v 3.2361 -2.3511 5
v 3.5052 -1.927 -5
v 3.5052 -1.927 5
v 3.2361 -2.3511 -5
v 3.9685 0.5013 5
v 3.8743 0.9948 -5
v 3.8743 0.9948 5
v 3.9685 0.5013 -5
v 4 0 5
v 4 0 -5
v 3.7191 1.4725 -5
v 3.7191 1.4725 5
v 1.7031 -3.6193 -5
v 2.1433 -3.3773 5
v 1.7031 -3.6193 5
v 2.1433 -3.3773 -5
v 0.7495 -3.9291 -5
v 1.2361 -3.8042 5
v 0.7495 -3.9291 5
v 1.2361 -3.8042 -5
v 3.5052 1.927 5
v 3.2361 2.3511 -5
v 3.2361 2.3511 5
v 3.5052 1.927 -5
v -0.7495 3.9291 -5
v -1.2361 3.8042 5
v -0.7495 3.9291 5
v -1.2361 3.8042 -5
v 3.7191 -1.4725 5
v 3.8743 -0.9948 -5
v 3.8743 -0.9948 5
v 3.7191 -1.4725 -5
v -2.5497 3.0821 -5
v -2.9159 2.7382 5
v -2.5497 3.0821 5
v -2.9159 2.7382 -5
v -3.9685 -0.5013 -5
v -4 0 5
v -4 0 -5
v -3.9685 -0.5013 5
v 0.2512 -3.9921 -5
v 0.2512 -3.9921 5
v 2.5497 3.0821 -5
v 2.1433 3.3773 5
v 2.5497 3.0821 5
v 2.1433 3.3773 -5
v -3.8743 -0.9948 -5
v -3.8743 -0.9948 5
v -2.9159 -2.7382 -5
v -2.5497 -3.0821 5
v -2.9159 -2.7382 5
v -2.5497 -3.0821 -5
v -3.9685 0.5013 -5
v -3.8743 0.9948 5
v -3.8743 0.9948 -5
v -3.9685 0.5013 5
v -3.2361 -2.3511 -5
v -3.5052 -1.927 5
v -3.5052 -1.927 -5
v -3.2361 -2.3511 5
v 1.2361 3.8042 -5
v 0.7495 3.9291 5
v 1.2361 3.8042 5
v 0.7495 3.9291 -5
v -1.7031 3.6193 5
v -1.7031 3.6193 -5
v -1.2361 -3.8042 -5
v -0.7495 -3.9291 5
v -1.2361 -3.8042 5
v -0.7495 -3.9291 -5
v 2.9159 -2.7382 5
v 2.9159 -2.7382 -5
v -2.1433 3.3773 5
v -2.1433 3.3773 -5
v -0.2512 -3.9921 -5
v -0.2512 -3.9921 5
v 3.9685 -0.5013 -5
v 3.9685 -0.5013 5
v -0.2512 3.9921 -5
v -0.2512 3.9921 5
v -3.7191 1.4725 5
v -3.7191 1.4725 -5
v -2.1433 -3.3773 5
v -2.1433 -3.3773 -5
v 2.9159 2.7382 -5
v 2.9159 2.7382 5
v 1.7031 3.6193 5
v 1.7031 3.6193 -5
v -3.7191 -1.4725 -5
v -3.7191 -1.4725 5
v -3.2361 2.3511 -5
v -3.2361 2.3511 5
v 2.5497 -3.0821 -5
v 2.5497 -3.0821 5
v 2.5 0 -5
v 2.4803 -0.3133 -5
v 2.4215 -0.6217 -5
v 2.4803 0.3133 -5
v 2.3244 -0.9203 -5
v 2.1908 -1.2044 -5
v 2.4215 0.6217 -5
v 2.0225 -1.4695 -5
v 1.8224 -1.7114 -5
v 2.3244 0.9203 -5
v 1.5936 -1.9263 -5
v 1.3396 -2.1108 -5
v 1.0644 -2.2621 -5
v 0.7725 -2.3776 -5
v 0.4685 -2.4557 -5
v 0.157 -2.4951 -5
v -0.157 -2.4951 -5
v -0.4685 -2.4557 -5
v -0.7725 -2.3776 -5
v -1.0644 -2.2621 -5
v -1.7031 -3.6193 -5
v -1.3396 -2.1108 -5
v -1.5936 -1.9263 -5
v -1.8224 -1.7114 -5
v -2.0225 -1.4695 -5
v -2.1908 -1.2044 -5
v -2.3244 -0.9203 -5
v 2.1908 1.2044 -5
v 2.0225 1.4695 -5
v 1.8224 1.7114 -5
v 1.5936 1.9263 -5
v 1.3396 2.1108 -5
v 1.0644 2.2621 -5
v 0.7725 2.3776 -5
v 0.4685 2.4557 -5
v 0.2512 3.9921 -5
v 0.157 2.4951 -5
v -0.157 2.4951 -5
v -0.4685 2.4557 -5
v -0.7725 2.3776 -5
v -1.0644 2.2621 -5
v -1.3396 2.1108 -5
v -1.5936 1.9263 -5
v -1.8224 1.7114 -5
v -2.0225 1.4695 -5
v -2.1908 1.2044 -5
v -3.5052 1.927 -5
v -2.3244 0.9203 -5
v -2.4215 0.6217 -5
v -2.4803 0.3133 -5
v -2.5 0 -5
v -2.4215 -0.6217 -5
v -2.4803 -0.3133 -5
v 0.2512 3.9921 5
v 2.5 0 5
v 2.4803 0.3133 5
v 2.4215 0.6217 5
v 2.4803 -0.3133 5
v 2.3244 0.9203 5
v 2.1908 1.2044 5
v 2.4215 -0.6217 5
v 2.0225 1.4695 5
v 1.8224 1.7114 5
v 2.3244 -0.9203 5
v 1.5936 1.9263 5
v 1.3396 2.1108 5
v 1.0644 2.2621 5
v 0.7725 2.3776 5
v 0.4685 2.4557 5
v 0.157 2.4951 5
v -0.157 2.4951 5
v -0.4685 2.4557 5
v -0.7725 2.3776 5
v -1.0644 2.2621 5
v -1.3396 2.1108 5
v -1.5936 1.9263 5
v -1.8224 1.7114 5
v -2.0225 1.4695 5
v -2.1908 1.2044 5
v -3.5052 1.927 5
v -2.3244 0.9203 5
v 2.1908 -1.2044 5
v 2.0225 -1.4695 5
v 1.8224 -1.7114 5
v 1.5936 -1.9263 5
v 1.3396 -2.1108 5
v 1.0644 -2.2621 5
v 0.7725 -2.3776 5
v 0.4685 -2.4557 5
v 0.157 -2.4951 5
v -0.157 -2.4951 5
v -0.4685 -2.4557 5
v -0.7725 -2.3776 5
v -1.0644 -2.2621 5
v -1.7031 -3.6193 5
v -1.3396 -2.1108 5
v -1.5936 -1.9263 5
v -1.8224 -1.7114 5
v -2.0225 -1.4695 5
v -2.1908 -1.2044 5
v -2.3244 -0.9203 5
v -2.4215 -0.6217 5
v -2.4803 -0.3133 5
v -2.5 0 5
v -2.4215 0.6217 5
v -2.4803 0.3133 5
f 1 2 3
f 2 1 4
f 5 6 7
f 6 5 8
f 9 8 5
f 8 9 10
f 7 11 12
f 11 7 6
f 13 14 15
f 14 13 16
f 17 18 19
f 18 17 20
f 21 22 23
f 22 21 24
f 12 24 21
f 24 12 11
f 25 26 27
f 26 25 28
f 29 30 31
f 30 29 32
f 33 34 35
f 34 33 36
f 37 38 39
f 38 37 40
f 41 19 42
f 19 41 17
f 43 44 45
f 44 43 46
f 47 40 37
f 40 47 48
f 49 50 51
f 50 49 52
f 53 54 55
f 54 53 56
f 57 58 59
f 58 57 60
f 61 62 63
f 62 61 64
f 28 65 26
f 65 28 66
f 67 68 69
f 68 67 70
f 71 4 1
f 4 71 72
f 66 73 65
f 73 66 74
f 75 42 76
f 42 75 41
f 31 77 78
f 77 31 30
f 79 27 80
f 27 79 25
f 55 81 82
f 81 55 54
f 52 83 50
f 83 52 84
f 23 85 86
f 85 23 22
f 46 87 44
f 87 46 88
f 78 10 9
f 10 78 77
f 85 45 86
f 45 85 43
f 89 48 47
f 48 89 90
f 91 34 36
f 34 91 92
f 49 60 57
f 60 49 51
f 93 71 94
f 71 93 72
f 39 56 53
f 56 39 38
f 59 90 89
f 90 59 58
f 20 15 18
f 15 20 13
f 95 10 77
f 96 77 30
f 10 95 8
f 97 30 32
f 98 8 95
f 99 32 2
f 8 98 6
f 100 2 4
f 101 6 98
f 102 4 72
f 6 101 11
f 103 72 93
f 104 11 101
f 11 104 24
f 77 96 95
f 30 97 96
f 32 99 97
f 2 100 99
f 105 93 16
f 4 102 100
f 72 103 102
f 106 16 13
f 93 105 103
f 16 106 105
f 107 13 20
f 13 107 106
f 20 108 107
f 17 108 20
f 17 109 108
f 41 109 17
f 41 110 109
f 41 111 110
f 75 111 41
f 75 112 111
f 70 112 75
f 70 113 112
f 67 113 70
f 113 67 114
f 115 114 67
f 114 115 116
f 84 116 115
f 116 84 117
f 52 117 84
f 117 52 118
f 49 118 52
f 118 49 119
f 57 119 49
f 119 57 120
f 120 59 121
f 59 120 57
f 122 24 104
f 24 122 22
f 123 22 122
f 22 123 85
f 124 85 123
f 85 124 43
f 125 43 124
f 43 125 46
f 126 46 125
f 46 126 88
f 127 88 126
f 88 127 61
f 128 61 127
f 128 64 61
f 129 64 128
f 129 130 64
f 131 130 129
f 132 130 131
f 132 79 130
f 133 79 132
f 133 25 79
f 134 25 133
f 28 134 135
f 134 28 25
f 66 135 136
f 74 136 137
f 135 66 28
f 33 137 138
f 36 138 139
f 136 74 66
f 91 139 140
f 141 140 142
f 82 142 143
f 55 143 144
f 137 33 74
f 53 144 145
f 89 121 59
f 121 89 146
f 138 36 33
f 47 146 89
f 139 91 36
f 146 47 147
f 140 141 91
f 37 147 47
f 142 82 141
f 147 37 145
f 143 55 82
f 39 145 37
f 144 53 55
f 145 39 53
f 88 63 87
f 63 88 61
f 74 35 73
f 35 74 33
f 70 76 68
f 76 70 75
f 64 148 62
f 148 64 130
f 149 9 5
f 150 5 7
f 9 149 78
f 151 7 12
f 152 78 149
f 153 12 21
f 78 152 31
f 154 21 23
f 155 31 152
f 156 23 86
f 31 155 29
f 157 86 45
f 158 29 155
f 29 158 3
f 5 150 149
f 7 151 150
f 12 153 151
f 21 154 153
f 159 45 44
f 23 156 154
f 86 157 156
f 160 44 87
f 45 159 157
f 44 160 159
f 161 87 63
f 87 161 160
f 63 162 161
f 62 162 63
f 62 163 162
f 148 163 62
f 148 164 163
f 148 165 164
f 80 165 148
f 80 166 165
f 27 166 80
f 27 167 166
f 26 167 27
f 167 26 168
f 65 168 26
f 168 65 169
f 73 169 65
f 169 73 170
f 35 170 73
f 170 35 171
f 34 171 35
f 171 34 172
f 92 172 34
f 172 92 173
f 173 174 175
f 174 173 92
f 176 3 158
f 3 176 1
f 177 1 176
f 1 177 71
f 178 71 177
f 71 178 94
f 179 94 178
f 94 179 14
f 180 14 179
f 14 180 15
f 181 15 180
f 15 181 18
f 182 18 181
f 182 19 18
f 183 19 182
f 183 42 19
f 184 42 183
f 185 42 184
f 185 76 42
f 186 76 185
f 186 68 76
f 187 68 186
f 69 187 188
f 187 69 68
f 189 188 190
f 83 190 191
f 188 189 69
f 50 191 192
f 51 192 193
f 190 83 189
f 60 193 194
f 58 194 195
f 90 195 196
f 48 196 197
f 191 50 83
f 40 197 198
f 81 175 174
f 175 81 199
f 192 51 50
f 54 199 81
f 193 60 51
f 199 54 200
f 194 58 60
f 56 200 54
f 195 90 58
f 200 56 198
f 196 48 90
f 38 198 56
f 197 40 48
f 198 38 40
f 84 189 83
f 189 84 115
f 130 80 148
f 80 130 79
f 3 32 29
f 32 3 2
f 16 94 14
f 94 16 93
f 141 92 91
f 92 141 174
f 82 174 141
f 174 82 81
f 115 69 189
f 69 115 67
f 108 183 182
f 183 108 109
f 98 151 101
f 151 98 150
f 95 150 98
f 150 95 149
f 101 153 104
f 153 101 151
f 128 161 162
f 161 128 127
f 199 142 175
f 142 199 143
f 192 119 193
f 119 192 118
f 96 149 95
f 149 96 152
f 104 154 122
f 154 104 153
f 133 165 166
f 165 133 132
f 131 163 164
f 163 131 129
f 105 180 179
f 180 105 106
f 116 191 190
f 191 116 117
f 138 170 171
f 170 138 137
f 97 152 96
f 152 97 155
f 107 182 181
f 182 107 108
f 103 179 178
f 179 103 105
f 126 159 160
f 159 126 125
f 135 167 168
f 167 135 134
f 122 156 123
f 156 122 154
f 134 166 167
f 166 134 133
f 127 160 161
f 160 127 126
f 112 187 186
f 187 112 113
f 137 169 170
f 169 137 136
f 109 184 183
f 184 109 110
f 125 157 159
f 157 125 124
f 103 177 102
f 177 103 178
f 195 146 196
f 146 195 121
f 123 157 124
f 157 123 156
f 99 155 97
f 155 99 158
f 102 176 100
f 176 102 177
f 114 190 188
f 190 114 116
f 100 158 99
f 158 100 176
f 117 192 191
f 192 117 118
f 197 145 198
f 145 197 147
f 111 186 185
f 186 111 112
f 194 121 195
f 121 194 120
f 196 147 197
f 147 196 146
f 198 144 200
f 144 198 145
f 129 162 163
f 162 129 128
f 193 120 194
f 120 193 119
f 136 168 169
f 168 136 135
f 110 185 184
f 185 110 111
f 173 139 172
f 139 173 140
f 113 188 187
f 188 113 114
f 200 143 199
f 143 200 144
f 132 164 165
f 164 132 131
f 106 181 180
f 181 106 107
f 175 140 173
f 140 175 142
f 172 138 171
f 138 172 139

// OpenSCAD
$fn = 50;


difference() {
	union() {
		translate(v = [0, 0, -5.0000000000]) {
			cylinder(h = 10, r = 4.0000000000);
		}
	}
	union() {
		translate(v = [0, 0, -100.0000000000]) {
			cylinder(h = 200, r = 2.5000000000);
		}
	}
}
